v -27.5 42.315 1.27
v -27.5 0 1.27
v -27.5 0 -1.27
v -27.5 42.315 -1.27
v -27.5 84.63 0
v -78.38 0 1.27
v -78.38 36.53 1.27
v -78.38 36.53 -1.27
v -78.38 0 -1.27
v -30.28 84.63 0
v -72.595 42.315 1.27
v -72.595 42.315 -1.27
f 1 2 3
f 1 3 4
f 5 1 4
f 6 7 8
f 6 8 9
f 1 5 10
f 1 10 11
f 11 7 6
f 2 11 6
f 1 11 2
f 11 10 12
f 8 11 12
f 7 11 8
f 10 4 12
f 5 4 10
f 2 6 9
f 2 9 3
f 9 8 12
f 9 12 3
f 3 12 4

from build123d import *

# Parameters (mm, degrees)
BOSS_EXTRUDE2_DEPTH = 1.27
CUT_EXTRUDE1_DEPTH  = 100.076


with BuildPart() as part:
    # Sketch2 → Boss-Extrude2 (new, symmetric)
    with BuildSketch(Plane.XY):
        Polygon((-30.279813291, 84.630063366), (-78.379813291, 36.530063366), (-78.379813291, 0), (-27.5, 0), (-27.5, 84.630063366), align=None)
    extrude(amount=BOSS_EXTRUDE2_DEPTH, both=True)

    # Sketch3 → Cut-Extrude1 (cut)
    with BuildSketch(Plane(origin=(0, 0, 0), x_dir=(0, 0, -1), z_dir=(1, 0, 0))):
        Polygon((0, 84.630063366), (-1.27, 42.315031683), (-13.710908903, 42.315031683), (-13.710908903, 86.832104907), (21.305265315, 86.832104907), (21.305265315, 42.315031683), (1.27, 42.315031683), align=None)
    extrude(amount=-CUT_EXTRUDE1_DEPTH, mode=Mode.SUBTRACT)


solid = part.part
